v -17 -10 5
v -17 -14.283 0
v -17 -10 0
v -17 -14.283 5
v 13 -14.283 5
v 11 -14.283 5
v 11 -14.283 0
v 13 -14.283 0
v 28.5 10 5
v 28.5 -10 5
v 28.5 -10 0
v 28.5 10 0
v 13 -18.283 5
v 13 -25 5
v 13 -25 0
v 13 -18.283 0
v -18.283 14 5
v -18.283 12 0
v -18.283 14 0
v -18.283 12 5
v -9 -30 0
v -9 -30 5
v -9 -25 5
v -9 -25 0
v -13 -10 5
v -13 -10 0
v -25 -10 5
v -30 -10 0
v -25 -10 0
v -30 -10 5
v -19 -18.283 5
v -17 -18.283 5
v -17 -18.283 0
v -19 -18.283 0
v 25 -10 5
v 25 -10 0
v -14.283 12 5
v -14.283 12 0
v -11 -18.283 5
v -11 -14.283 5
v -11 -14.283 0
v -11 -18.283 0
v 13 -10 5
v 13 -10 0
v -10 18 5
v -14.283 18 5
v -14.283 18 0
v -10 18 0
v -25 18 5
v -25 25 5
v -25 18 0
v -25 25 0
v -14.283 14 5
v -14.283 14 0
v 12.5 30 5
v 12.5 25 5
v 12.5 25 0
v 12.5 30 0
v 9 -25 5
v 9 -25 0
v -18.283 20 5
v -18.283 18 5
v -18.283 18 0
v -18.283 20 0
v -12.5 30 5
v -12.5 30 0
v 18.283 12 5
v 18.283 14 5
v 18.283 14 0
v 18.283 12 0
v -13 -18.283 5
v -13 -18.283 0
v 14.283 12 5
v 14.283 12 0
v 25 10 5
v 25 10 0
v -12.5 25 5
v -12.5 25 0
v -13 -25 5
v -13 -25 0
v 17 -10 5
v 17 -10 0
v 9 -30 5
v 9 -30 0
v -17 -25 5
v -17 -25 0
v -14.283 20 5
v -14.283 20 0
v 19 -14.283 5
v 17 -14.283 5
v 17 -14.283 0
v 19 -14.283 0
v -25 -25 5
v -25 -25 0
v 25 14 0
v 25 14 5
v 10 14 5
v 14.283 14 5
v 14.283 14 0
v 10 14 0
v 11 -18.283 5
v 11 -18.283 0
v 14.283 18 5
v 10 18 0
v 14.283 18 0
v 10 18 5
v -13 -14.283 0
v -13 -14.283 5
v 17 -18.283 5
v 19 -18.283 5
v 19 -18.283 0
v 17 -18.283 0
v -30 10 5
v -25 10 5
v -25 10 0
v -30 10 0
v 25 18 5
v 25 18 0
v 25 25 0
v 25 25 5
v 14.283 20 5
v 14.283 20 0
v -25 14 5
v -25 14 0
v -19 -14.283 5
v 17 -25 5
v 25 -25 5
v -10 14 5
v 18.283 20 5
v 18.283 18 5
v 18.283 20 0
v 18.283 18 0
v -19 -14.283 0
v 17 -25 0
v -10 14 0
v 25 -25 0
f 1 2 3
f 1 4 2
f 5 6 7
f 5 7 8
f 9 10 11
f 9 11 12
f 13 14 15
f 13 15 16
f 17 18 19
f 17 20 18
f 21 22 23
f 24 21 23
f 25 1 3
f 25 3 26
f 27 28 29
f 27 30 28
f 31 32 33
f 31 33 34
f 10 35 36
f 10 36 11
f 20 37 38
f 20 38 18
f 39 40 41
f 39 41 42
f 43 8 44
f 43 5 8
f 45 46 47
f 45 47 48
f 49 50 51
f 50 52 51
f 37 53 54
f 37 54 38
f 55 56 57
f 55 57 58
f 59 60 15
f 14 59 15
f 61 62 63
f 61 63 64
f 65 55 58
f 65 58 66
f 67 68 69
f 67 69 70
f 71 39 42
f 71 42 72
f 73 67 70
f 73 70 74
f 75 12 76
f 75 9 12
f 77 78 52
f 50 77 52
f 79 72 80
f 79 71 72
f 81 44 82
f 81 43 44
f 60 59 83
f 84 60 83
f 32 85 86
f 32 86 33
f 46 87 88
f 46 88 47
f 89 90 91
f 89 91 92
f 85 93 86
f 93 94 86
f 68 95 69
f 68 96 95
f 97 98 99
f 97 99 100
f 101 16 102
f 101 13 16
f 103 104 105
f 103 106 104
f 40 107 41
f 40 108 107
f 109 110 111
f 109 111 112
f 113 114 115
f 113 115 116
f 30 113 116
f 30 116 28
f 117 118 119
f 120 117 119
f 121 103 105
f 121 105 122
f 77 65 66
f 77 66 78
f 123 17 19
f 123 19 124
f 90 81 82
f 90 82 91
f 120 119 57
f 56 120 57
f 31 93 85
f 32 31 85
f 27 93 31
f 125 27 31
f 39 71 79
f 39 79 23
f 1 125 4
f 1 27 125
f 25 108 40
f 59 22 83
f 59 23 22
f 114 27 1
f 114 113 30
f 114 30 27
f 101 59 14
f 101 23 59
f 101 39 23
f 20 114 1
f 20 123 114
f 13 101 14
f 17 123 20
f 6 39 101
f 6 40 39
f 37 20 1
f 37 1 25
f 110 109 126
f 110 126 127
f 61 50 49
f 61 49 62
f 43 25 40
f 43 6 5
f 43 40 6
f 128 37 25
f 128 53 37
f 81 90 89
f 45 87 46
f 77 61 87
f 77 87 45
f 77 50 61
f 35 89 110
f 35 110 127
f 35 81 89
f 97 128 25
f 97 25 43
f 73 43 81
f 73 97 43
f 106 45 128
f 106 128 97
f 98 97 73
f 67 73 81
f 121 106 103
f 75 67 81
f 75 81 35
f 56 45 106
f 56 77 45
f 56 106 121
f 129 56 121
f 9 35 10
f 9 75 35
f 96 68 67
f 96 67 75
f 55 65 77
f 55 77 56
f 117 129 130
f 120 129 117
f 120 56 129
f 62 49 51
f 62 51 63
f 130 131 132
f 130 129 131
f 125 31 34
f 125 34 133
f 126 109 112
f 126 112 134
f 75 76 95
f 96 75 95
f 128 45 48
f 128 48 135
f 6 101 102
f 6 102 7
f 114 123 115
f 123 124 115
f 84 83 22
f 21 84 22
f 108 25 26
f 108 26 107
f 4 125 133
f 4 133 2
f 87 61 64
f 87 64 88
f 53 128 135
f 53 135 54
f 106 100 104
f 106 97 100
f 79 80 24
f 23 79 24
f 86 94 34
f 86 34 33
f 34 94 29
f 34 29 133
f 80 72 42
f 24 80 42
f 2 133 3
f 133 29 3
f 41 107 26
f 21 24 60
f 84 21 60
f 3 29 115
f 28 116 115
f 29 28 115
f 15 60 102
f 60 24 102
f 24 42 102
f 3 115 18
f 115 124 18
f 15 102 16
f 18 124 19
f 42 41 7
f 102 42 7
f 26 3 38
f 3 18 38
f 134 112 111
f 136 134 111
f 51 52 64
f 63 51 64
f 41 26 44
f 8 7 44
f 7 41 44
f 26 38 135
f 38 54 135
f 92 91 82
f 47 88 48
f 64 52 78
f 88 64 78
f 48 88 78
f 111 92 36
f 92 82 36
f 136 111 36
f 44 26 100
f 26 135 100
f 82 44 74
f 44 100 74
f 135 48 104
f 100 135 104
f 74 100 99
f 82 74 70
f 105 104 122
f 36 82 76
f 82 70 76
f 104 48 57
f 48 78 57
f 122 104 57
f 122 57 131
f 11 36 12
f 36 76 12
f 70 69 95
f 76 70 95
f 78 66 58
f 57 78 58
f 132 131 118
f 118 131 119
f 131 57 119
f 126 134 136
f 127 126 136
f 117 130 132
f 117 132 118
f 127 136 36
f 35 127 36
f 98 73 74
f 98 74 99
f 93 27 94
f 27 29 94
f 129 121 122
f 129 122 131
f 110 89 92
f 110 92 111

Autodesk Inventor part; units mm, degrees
ref_plane "YZ Plane" through (0, 0, 0) normal (1, 0, 0) x (0, 1, 0)
ref_plane "XZ Plane" through (0, 0, 0) normal (0, 1, 0) x (-1, 0, 0)
ref_plane "XY Plane" through (0, 0, 0) normal (0, 0, 1) x (1, 0, 0)
sketch "Sketch1" plane through (0, 0, 0) normal (0, 0, 1) x (1, 0, 0)
  line L0 (-25, -25) -> (25, -25)
  line L1 (25, -25) -> (25, 25)
  line L2 (25, 25) -> (-25, 25)
  line L3 (-25, 25) -> (-25, -25)
  line L4 (-25, -25) -> (25, 25) construction
  line L5 (25, -25) -> (-25, 25) construction
  point P0 (0, 0)
  dimension "d0" = 50
  dimension "d1" = 50
extrude "Extrusion1" add sketch "Sketch1" along normal blind 5
sketch "Sketch2" plane through (0, 0, 5) normal (0, 0, 1) x (1, 0, 0)
  line L0 (-25, -25) -> (25, -25) construction
  line L1 (25, -25) -> (25, 25) construction
  line L2 (25, 25) -> (-25, 25) construction
  line L3 (-25, 25) -> (-25, -25) construction
  line L4 (-25, -25) -> (25, -25) construction
  line L5 (-9, -25) -> (9, -25)
  line L6 (9, -25) -> (9, -30)
  line L7 (9, -30) -> (-9, -30)
  line L8 (-9, -30) -> (-9, -25)
  line L9 (-25, 10) -> (-30, 10)
  line L10 (-30, 10) -> (-30, -10)
  line L11 (-30, -10) -> (-25, -10)
  line L12 (-25, -10) -> (-25, 10)
  line L13 (25, 25) -> (-25, 25) construction
  line L14 (-12.5, 25) -> (12.5, 25)
  line L15 (12.5, 25) -> (12.5, 30)
  line L16 (12.5, 30) -> (-12.5, 30)
  line L17 (-12.5, 30) -> (-12.5, 25)
  line L18 (25, -10) -> (28.5, -10)
  line L19 (28.5, -10) -> (28.5, 10)
  line L20 (28.5, 10) -> (25, 10)
  line L21 (25, 10) -> (25, -10)
  point P0 (0, 0)
  dimension "d4" = 18
  dimension "d5" = 5
  dimension "d6" = 16
  dimension "d7" = 5
  dimension "d8" = 20
  dimension "d9" = 15
  dimension "d10" = 25
  dimension "d11" = 12.5
  dimension "d14" = 3.5
  dimension "d15" = 20
  dimension "d16" = 15
  dimension "d39" = 5
extrude "Extrusion2" add sketch "Sketch2" against normal blind 5
sketch "Sketch3" plane through (0, 0, 5) normal (0, 0, 1) x (1, 0, 0)
  line L0 (-25, -25) -> (-9, -25) construction
  line L1 (-9, -30) -> (-9, -25) construction
  line L2 (9, -30) -> (-9, -30) construction
  line L3 (9, -25) -> (9, -30) construction
  line L4 (9, -25) -> (25, -25) construction
  line L5 (25, -25) -> (25, -10) construction
  line L6 (25, -10) -> (28.5, -10) construction
  line L7 (28.5, -10) -> (28.5, 10) construction
  line L8 (28.5, 10) -> (25, 10) construction
  line L9 (25, 10) -> (25, 25) construction
  line L10 (25, 25) -> (12.5, 25) construction
  line L11 (12.5, 25) -> (12.5, 30) construction
  line L12 (12.5, 30) -> (-12.5, 30) construction
  line L13 (-12.5, 30) -> (-12.5, 25) construction
  line L14 (-12.5, 25) -> (-25, 25) construction
  line L15 (-25, 25) -> (-25, 10) construction
  line L16 (-25, 10) -> (-30, 10) construction
  line L17 (-30, 10) -> (-30, -10) construction
  line L18 (-30, -10) -> (-25, -10) construction
  line L19 (-25, -10) -> (-25, -25) construction
  line L20 (-25, 25) -> (-25, 10) construction
  line L21 (-25, 18) -> (-10, 18) construction
  line L22 (-10, 18) -> (-10, 14) construction
  line L23 (-10, 14) -> (-25, 14) construction
  line L24 (-25, 14) -> (-25, 18) construction
  line L25 (-10, 16) -> (-25, 16) construction
  line L26 (-18.2831, 12) -> (-14.2831, 12) construction
  line L27 (-14.2831, 12) -> (-14.2831, 20) construction
  line L28 (-14.2831, 20) -> (-18.2831, 20) construction
  line L29 (-18.2831, 20) -> (-18.2831, 12) construction
  line L30 (-18.2831, 12) -> (-14.2831, 20) construction
  line L31 (-14.2831, 12) -> (-18.2831, 20) construction
  line L32 (-25, 14) -> (-25, 18)
  line L33 (-25, 18) -> (-18.2831, 18)
  line L34 (-18.2831, 18) -> (-18.2831, 20)
  line L35 (-18.2831, 20) -> (-14.2831, 20)
  line L36 (-14.2831, 20) -> (-14.2831, 18)
  line L37 (-14.2831, 18) -> (-10, 18)
  line L38 (-10, 18) -> (-10, 14)
  line L39 (-10, 14) -> (-14.2831, 14)
  line L40 (-14.2831, 14) -> (-14.2831, 12)
  line L41 (-14.2831, 12) -> (-18.2831, 12)
  line L42 (-18.2831, 12) -> (-18.2831, 14)
  line L43 (-18.2831, 14) -> (-25, 14)
  line L44 (-17, -25) -> (-17, -10) construction
  line L45 (-17, -10) -> (-13, -10) construction
  line L46 (-13, -10) -> (-13, -25) construction
  line L47 (-13, -25) -> (-17, -25) construction
  line L48 (-15, -10) -> (-15, -25) construction
  line L49 (-11, -18.2831) -> (-11, -14.2831) construction
  line L50 (-11, -14.2831) -> (-19, -14.2831) construction
  line L51 (-19, -14.2831) -> (-19, -18.2831) construction
  line L52 (-19, -18.2831) -> (-11, -18.2831) construction
  line L53 (-11, -18.2831) -> (-19, -14.2831) construction
  line L54 (-11, -14.2831) -> (-19, -18.2831) construction
  line L55 (-13, -25) -> (-17, -25)
  line L56 (-17, -25) -> (-17, -18.2831)
  line L57 (-17, -18.2831) -> (-19, -18.2831)
  line L58 (-19, -18.2831) -> (-19, -14.2831)
  line L59 (-19, -14.2831) -> (-17, -14.2831)
  line L60 (-17, -14.2831) -> (-17, -10)
  line L61 (-17, -10) -> (-13, -10)
  line L62 (-13, -10) -> (-13, -14.2831)
  line L63 (-13, -14.2831) -> (-11, -14.2831)
  line L64 (-11, -14.2831) -> (-11, -18.2831)
  line L65 (-11, -18.2831) -> (-13, -18.2831)
  line L66 (-13, -18.2831) -> (-13, -25)
  line L67 (13, -10) -> (17, -10) construction
  line L68 (13, -10) -> (17, -10)
  line L69 (11, -14.2831) -> (13, -14.2831)
  line L70 (13, -14.2831) -> (13, -10)
  line L71 (17, -10) -> (17, -14.2831)
  line L72 (19, -14.2831) -> (11, -14.2831) construction
  line L73 (17, -14.2831) -> (19, -14.2831)
  line L74 (11, -14.2831) -> (11, -18.2831) construction
  line L75 (11, -18.2831) -> (11, -14.2831)
  line L76 (19, -18.2831) -> (11, -14.2831) construction
  line L77 (19, -14.2831) -> (11, -18.2831) construction
  line L78 (19, -18.2831) -> (19, -14.2831) construction
  line L79 (19, -14.2831) -> (19, -18.2831)
  line L80 (13, -25) -> (13, -10) construction
  line L81 (15, -10) -> (15, -25) construction
  line L82 (17, -10) -> (17, -25) construction
  line L83 (13, -18.2831) -> (11, -18.2831)
  line L84 (19, -18.2831) -> (17, -18.2831)
  line L85 (17, -18.2831) -> (17, -25)
  line L86 (17, -25) -> (13, -25) construction
  line L87 (17, -25) -> (13, -25)
  line L88 (13, -25) -> (13, -18.2831)
  line L89 (11, -18.2831) -> (19, -18.2831) construction
  line L90 (25, 14) -> (10, 14) construction
  line L91 (10, 14) -> (10, 18) construction
  line L92 (10, 18) -> (25, 18) construction
  line L93 (25, 18) -> (25, 14) construction
  line L94 (10, 16) -> (25, 16) construction
  line L95 (18.2831, 20) -> (14.2831, 20) construction
  line L96 (14.2831, 20) -> (14.2831, 12) construction
  line L97 (14.2831, 12) -> (18.2831, 12) construction
  line L98 (18.2831, 12) -> (18.2831, 20) construction
  line L99 (18.2831, 20) -> (14.2831, 12) construction
  line L100 (14.2831, 20) -> (18.2831, 12) construction
  line L101 (25, 18) -> (25, 14)
  line L102 (25, 14) -> (18.2831, 14)
  line L103 (18.2831, 14) -> (18.2831, 12)
  line L104 (18.2831, 12) -> (14.2831, 12)
  line L105 (14.2831, 12) -> (14.2831, 14)
  line L106 (14.2831, 14) -> (10, 14)
  line L107 (10, 14) -> (10, 18)
  line L108 (10, 18) -> (14.2831, 18)
  line L109 (14.2831, 18) -> (14.2831, 20)
  line L110 (14.2831, 20) -> (18.2831, 20)
  line L111 (18.2831, 20) -> (18.2831, 18)
  line L112 (18.2831, 18) -> (25, 18)
  point P0 (0, 0)
  point P1 (-16.2831, 16)
  point P2 (-15, -16.2831)
  point P3 (15, -16.2831)
  point P4 (16.2831, 16)
  dimension "d17" = 15
  dimension "d18" = 4
  dimension "d19" = 4
  dimension "d20" = 8
  dimension "d21" = 15
  dimension "d22" = 4
  dimension "d23" = 4
  dimension "d24" = 8
  dimension "d25" = 15
  dimension "d26" = 4
  dimension "d27" = 4
  dimension "d28" = 8
  dimension "d29" = 8
  dimension "d30" = 4
  dimension "d31" = 4
  dimension "d32" = 15
  dimension "d33" = 4
  dimension "d34" = 4
  dimension "d35" = 8
  dimension "d36" = 7
extrude "Extrusion3" cut sketch "Sketch3" against normal blind 5
properties part number "Soporte_Ducto_Rod"
